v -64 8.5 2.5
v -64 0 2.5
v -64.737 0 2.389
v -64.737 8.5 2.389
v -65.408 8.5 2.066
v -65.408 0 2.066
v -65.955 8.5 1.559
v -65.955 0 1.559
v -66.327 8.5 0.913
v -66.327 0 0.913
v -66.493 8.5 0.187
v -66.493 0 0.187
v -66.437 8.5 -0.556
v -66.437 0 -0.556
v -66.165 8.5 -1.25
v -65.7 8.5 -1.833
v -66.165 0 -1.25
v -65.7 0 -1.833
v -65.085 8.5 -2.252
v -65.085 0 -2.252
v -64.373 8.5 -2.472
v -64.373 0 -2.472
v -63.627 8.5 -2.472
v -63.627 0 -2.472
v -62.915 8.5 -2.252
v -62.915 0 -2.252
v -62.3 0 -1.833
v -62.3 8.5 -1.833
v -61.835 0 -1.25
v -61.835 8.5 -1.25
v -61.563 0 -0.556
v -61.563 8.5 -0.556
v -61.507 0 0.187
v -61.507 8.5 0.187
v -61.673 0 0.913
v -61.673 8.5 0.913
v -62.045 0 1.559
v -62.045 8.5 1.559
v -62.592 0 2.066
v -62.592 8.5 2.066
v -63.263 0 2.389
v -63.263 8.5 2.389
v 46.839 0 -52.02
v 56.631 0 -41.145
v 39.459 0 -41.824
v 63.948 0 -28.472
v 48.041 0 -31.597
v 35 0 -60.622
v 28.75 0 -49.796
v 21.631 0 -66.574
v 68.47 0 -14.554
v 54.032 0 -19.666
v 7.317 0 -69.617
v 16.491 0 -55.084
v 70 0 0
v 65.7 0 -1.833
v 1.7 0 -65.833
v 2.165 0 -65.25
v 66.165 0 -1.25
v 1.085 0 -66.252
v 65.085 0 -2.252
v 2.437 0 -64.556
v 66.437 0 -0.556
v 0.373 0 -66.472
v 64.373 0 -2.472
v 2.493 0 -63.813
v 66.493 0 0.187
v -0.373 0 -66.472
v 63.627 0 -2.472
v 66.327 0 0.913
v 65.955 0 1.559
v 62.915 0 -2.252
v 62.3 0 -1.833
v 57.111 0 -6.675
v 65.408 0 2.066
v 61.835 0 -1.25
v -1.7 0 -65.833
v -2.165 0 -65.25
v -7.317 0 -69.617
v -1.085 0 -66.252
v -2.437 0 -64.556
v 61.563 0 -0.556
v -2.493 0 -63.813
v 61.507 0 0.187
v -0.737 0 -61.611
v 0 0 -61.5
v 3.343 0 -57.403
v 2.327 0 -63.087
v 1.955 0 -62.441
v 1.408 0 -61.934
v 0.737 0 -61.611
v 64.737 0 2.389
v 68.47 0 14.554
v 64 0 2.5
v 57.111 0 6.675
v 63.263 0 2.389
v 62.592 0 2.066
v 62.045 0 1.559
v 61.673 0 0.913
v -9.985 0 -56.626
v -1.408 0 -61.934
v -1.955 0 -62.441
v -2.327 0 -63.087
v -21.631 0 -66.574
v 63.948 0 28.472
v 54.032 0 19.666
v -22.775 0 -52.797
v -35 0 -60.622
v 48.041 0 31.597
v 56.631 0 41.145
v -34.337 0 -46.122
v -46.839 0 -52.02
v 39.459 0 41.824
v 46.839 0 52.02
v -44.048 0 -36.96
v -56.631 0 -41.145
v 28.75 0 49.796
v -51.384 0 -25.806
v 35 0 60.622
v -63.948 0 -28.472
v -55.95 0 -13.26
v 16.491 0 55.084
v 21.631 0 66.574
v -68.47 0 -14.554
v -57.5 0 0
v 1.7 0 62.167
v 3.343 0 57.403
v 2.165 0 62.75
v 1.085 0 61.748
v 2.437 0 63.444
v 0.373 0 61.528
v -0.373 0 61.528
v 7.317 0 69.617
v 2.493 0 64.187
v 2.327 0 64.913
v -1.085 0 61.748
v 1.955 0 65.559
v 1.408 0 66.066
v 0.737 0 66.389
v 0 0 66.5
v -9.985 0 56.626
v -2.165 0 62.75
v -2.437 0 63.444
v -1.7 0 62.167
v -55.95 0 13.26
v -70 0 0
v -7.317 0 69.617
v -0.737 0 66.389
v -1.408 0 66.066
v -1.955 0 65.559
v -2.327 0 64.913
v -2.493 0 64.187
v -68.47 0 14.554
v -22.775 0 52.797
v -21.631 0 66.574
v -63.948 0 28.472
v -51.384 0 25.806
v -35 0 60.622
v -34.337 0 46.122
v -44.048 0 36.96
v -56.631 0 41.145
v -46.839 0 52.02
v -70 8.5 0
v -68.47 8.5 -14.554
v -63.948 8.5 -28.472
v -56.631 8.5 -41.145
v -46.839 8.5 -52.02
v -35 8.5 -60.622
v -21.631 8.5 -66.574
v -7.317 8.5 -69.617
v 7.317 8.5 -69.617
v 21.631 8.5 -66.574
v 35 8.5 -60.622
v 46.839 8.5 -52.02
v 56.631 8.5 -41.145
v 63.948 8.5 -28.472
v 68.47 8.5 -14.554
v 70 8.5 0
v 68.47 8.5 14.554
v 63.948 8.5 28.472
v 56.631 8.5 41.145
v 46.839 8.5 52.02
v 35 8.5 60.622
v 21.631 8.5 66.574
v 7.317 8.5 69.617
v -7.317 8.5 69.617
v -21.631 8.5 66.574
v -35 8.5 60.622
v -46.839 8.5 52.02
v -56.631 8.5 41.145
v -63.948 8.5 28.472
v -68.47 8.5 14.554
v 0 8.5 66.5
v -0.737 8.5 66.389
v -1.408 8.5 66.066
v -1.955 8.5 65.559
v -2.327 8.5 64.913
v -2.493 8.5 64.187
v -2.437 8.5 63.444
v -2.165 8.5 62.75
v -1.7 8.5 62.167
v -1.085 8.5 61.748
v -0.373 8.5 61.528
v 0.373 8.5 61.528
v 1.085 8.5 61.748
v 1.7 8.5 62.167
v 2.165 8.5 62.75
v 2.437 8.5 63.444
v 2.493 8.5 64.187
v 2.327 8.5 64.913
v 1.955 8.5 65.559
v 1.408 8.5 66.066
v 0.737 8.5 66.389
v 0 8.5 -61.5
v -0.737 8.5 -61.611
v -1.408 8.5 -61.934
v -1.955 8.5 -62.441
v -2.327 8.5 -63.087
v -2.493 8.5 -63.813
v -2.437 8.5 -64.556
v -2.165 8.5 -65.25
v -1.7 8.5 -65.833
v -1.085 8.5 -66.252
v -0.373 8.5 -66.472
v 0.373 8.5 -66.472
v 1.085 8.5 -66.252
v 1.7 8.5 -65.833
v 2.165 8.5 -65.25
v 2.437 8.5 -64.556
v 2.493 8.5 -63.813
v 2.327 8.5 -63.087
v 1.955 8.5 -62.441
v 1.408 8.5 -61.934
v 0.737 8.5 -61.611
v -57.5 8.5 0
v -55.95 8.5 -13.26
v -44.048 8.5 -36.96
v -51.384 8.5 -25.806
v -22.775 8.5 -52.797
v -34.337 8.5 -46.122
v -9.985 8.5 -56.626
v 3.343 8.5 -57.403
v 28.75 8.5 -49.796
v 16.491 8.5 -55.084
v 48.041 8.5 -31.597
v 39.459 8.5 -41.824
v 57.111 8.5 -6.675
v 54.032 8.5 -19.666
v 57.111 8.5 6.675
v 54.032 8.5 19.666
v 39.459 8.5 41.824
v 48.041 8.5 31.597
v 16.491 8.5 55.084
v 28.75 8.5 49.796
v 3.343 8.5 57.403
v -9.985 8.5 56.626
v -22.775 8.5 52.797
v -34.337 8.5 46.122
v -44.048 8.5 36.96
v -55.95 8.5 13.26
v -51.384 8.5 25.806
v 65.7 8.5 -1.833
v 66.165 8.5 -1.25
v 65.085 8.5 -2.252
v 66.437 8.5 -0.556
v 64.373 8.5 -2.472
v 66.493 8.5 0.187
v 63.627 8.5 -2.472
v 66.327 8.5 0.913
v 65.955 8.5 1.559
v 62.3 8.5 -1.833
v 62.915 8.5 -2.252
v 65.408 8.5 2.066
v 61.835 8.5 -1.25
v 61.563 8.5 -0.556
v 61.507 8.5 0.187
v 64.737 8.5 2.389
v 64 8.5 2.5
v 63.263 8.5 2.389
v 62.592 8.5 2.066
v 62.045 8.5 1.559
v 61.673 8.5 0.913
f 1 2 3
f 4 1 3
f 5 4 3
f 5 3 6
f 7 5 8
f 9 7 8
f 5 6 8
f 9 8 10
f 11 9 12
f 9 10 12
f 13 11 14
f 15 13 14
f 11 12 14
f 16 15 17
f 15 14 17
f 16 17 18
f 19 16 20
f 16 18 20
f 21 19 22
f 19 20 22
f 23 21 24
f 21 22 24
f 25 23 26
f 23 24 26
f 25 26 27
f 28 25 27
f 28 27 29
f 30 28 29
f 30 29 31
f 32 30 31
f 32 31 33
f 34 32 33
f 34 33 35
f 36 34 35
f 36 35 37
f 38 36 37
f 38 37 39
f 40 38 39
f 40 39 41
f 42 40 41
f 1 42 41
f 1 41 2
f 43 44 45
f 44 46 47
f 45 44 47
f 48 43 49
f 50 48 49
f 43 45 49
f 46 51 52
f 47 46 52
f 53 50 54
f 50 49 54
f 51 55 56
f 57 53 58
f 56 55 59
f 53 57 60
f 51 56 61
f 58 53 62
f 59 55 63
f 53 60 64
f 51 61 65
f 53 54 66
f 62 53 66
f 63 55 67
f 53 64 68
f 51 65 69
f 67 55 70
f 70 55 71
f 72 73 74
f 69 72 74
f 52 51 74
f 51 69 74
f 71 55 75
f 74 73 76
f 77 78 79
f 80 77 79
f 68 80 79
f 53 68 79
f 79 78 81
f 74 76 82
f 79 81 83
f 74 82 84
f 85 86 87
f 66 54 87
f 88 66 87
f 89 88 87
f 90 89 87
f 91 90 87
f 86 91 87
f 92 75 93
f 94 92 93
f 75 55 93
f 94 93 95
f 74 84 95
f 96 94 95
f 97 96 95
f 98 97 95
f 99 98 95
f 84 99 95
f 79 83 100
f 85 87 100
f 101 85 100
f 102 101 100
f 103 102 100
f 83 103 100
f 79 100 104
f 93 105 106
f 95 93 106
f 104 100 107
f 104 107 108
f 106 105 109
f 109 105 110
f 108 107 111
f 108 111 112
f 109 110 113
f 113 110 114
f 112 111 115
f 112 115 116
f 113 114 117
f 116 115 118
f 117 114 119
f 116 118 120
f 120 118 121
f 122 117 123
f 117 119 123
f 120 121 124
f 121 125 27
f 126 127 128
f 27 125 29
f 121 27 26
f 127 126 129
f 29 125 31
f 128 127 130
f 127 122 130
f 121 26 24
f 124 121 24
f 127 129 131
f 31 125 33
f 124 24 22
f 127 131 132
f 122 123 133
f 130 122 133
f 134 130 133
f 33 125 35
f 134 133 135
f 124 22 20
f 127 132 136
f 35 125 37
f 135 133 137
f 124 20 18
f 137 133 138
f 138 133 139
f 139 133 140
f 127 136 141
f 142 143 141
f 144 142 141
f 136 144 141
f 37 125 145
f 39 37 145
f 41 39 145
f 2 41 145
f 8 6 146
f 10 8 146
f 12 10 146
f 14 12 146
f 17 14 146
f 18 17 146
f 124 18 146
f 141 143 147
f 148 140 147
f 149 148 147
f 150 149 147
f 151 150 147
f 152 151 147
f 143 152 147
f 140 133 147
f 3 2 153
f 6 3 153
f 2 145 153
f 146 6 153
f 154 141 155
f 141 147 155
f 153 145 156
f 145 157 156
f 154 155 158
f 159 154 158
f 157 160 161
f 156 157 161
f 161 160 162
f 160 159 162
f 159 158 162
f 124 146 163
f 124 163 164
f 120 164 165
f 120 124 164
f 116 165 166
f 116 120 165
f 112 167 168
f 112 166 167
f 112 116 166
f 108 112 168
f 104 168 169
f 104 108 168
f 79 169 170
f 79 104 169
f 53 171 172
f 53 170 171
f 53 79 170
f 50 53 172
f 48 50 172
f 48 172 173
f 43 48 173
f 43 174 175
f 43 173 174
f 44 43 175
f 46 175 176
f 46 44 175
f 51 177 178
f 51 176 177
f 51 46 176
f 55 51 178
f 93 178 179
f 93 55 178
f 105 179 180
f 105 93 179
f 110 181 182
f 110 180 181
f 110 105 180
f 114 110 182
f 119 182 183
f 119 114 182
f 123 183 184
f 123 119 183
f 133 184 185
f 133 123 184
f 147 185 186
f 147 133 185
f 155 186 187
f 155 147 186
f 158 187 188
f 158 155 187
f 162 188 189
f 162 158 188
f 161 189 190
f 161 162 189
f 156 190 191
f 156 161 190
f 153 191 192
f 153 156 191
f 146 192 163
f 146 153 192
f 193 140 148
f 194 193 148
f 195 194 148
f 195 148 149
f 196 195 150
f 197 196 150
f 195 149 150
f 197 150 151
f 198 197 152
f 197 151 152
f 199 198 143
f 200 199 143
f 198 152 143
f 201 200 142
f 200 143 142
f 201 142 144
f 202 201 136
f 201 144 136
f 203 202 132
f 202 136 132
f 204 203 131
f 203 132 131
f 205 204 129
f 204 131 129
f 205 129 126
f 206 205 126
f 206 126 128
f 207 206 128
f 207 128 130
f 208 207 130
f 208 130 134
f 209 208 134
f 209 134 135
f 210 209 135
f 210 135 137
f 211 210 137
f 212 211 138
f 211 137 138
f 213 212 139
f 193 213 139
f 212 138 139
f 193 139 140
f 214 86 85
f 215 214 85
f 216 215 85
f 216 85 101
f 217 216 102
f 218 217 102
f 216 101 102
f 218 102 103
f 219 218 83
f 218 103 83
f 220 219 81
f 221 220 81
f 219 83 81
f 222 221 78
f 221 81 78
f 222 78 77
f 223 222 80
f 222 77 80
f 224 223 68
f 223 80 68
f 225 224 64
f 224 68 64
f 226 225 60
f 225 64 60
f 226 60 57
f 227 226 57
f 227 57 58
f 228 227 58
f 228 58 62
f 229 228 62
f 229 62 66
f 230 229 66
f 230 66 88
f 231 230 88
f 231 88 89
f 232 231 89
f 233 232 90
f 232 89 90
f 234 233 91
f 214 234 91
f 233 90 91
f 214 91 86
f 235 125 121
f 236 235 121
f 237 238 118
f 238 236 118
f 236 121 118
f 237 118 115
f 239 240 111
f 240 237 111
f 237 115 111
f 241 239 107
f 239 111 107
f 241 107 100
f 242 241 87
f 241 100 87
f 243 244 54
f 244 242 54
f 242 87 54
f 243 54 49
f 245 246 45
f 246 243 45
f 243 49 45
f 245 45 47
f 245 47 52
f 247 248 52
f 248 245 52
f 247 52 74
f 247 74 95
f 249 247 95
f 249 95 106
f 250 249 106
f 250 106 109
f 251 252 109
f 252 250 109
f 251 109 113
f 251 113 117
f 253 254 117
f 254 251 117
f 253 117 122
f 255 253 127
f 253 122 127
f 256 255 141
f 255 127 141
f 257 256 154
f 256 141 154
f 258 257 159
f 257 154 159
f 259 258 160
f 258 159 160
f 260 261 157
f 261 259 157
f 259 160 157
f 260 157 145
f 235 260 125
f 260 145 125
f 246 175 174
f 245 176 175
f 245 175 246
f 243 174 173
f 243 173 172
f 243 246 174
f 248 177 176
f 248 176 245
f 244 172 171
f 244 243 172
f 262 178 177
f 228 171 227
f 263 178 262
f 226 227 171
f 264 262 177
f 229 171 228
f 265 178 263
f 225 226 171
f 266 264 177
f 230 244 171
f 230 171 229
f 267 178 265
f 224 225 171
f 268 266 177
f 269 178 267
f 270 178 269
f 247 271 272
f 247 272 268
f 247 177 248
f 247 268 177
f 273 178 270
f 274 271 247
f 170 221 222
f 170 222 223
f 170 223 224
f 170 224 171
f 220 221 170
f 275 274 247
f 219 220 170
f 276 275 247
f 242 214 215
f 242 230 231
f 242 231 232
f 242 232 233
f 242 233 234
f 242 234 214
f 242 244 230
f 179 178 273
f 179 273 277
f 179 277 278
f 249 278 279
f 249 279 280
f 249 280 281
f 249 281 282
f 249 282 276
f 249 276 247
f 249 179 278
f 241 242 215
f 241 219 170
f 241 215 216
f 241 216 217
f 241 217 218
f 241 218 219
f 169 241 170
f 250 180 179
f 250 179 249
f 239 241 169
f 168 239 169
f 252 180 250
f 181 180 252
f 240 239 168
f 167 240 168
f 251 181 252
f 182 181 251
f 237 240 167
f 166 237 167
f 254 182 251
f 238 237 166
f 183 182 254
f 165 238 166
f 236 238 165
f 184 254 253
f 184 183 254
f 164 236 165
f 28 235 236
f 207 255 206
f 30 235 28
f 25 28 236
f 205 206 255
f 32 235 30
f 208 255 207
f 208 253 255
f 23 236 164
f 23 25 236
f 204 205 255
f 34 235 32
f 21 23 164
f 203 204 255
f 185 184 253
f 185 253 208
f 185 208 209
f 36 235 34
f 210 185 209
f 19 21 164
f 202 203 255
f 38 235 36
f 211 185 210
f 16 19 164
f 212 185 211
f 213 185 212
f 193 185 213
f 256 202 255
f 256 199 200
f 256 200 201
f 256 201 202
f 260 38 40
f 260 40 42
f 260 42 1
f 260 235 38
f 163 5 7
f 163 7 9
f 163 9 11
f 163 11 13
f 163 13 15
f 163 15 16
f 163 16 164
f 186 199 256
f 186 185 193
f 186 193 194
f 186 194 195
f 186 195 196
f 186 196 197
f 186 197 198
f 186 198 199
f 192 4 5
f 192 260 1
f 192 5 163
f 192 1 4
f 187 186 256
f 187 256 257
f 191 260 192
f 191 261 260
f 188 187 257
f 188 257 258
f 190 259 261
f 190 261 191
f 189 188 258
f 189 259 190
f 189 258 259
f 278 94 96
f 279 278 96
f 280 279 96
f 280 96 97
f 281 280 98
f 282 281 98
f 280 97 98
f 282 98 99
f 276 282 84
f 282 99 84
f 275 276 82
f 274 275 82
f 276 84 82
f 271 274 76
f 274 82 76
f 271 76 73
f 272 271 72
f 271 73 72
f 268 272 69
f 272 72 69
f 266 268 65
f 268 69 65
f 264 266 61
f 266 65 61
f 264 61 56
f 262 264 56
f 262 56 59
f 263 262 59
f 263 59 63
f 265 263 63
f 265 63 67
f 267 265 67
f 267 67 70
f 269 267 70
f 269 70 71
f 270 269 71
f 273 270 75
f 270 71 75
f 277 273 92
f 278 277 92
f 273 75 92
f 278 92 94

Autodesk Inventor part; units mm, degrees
ref_plane "YZ Plane" through (0, 0, 0) normal (1, 0, 0) x (0, 1, 0)
ref_plane "XZ Plane" through (0, 0, 0) normal (0, 1, 0) x (-1, 0, 0)
ref_plane "XY Plane" through (0, 0, 0) normal (0, 0, 1) x (1, 0, 0)
sketch "スケッチ1" plane through (0, 0, 0) normal (0, 1, 0) x (-1, 0, 0)
  circle A0 centre (0, 0) radius 57.5
  circle A1 centre (0, 0) radius 70
  dimension "d0" = 115
  dimension "d1" = 140
extrude "押し出し1" add sketch "スケッチ1" along normal blind 8.5
sketch "スケッチ2" plane through (0, 8.5, 0) normal (0, 1, 0) x (1, 0, 0)
  point P0 (0, 0)
  point P1 (0, 64)
  point P2 (-64, 0)
  point P3 (0, -64)
  point P4 (64, 0)
  dimension "d4" = 64
  dimension "d7" = 360
hole "穴1" at (0, 8.5, -64) at (-64, 8.5, 0) at (0, 8.5, 64) at (64, 8.5, 0) direction (0, -1, 0) diameter 5 end through all
properties part number "turntable2" material "アルミニウム 6061"
